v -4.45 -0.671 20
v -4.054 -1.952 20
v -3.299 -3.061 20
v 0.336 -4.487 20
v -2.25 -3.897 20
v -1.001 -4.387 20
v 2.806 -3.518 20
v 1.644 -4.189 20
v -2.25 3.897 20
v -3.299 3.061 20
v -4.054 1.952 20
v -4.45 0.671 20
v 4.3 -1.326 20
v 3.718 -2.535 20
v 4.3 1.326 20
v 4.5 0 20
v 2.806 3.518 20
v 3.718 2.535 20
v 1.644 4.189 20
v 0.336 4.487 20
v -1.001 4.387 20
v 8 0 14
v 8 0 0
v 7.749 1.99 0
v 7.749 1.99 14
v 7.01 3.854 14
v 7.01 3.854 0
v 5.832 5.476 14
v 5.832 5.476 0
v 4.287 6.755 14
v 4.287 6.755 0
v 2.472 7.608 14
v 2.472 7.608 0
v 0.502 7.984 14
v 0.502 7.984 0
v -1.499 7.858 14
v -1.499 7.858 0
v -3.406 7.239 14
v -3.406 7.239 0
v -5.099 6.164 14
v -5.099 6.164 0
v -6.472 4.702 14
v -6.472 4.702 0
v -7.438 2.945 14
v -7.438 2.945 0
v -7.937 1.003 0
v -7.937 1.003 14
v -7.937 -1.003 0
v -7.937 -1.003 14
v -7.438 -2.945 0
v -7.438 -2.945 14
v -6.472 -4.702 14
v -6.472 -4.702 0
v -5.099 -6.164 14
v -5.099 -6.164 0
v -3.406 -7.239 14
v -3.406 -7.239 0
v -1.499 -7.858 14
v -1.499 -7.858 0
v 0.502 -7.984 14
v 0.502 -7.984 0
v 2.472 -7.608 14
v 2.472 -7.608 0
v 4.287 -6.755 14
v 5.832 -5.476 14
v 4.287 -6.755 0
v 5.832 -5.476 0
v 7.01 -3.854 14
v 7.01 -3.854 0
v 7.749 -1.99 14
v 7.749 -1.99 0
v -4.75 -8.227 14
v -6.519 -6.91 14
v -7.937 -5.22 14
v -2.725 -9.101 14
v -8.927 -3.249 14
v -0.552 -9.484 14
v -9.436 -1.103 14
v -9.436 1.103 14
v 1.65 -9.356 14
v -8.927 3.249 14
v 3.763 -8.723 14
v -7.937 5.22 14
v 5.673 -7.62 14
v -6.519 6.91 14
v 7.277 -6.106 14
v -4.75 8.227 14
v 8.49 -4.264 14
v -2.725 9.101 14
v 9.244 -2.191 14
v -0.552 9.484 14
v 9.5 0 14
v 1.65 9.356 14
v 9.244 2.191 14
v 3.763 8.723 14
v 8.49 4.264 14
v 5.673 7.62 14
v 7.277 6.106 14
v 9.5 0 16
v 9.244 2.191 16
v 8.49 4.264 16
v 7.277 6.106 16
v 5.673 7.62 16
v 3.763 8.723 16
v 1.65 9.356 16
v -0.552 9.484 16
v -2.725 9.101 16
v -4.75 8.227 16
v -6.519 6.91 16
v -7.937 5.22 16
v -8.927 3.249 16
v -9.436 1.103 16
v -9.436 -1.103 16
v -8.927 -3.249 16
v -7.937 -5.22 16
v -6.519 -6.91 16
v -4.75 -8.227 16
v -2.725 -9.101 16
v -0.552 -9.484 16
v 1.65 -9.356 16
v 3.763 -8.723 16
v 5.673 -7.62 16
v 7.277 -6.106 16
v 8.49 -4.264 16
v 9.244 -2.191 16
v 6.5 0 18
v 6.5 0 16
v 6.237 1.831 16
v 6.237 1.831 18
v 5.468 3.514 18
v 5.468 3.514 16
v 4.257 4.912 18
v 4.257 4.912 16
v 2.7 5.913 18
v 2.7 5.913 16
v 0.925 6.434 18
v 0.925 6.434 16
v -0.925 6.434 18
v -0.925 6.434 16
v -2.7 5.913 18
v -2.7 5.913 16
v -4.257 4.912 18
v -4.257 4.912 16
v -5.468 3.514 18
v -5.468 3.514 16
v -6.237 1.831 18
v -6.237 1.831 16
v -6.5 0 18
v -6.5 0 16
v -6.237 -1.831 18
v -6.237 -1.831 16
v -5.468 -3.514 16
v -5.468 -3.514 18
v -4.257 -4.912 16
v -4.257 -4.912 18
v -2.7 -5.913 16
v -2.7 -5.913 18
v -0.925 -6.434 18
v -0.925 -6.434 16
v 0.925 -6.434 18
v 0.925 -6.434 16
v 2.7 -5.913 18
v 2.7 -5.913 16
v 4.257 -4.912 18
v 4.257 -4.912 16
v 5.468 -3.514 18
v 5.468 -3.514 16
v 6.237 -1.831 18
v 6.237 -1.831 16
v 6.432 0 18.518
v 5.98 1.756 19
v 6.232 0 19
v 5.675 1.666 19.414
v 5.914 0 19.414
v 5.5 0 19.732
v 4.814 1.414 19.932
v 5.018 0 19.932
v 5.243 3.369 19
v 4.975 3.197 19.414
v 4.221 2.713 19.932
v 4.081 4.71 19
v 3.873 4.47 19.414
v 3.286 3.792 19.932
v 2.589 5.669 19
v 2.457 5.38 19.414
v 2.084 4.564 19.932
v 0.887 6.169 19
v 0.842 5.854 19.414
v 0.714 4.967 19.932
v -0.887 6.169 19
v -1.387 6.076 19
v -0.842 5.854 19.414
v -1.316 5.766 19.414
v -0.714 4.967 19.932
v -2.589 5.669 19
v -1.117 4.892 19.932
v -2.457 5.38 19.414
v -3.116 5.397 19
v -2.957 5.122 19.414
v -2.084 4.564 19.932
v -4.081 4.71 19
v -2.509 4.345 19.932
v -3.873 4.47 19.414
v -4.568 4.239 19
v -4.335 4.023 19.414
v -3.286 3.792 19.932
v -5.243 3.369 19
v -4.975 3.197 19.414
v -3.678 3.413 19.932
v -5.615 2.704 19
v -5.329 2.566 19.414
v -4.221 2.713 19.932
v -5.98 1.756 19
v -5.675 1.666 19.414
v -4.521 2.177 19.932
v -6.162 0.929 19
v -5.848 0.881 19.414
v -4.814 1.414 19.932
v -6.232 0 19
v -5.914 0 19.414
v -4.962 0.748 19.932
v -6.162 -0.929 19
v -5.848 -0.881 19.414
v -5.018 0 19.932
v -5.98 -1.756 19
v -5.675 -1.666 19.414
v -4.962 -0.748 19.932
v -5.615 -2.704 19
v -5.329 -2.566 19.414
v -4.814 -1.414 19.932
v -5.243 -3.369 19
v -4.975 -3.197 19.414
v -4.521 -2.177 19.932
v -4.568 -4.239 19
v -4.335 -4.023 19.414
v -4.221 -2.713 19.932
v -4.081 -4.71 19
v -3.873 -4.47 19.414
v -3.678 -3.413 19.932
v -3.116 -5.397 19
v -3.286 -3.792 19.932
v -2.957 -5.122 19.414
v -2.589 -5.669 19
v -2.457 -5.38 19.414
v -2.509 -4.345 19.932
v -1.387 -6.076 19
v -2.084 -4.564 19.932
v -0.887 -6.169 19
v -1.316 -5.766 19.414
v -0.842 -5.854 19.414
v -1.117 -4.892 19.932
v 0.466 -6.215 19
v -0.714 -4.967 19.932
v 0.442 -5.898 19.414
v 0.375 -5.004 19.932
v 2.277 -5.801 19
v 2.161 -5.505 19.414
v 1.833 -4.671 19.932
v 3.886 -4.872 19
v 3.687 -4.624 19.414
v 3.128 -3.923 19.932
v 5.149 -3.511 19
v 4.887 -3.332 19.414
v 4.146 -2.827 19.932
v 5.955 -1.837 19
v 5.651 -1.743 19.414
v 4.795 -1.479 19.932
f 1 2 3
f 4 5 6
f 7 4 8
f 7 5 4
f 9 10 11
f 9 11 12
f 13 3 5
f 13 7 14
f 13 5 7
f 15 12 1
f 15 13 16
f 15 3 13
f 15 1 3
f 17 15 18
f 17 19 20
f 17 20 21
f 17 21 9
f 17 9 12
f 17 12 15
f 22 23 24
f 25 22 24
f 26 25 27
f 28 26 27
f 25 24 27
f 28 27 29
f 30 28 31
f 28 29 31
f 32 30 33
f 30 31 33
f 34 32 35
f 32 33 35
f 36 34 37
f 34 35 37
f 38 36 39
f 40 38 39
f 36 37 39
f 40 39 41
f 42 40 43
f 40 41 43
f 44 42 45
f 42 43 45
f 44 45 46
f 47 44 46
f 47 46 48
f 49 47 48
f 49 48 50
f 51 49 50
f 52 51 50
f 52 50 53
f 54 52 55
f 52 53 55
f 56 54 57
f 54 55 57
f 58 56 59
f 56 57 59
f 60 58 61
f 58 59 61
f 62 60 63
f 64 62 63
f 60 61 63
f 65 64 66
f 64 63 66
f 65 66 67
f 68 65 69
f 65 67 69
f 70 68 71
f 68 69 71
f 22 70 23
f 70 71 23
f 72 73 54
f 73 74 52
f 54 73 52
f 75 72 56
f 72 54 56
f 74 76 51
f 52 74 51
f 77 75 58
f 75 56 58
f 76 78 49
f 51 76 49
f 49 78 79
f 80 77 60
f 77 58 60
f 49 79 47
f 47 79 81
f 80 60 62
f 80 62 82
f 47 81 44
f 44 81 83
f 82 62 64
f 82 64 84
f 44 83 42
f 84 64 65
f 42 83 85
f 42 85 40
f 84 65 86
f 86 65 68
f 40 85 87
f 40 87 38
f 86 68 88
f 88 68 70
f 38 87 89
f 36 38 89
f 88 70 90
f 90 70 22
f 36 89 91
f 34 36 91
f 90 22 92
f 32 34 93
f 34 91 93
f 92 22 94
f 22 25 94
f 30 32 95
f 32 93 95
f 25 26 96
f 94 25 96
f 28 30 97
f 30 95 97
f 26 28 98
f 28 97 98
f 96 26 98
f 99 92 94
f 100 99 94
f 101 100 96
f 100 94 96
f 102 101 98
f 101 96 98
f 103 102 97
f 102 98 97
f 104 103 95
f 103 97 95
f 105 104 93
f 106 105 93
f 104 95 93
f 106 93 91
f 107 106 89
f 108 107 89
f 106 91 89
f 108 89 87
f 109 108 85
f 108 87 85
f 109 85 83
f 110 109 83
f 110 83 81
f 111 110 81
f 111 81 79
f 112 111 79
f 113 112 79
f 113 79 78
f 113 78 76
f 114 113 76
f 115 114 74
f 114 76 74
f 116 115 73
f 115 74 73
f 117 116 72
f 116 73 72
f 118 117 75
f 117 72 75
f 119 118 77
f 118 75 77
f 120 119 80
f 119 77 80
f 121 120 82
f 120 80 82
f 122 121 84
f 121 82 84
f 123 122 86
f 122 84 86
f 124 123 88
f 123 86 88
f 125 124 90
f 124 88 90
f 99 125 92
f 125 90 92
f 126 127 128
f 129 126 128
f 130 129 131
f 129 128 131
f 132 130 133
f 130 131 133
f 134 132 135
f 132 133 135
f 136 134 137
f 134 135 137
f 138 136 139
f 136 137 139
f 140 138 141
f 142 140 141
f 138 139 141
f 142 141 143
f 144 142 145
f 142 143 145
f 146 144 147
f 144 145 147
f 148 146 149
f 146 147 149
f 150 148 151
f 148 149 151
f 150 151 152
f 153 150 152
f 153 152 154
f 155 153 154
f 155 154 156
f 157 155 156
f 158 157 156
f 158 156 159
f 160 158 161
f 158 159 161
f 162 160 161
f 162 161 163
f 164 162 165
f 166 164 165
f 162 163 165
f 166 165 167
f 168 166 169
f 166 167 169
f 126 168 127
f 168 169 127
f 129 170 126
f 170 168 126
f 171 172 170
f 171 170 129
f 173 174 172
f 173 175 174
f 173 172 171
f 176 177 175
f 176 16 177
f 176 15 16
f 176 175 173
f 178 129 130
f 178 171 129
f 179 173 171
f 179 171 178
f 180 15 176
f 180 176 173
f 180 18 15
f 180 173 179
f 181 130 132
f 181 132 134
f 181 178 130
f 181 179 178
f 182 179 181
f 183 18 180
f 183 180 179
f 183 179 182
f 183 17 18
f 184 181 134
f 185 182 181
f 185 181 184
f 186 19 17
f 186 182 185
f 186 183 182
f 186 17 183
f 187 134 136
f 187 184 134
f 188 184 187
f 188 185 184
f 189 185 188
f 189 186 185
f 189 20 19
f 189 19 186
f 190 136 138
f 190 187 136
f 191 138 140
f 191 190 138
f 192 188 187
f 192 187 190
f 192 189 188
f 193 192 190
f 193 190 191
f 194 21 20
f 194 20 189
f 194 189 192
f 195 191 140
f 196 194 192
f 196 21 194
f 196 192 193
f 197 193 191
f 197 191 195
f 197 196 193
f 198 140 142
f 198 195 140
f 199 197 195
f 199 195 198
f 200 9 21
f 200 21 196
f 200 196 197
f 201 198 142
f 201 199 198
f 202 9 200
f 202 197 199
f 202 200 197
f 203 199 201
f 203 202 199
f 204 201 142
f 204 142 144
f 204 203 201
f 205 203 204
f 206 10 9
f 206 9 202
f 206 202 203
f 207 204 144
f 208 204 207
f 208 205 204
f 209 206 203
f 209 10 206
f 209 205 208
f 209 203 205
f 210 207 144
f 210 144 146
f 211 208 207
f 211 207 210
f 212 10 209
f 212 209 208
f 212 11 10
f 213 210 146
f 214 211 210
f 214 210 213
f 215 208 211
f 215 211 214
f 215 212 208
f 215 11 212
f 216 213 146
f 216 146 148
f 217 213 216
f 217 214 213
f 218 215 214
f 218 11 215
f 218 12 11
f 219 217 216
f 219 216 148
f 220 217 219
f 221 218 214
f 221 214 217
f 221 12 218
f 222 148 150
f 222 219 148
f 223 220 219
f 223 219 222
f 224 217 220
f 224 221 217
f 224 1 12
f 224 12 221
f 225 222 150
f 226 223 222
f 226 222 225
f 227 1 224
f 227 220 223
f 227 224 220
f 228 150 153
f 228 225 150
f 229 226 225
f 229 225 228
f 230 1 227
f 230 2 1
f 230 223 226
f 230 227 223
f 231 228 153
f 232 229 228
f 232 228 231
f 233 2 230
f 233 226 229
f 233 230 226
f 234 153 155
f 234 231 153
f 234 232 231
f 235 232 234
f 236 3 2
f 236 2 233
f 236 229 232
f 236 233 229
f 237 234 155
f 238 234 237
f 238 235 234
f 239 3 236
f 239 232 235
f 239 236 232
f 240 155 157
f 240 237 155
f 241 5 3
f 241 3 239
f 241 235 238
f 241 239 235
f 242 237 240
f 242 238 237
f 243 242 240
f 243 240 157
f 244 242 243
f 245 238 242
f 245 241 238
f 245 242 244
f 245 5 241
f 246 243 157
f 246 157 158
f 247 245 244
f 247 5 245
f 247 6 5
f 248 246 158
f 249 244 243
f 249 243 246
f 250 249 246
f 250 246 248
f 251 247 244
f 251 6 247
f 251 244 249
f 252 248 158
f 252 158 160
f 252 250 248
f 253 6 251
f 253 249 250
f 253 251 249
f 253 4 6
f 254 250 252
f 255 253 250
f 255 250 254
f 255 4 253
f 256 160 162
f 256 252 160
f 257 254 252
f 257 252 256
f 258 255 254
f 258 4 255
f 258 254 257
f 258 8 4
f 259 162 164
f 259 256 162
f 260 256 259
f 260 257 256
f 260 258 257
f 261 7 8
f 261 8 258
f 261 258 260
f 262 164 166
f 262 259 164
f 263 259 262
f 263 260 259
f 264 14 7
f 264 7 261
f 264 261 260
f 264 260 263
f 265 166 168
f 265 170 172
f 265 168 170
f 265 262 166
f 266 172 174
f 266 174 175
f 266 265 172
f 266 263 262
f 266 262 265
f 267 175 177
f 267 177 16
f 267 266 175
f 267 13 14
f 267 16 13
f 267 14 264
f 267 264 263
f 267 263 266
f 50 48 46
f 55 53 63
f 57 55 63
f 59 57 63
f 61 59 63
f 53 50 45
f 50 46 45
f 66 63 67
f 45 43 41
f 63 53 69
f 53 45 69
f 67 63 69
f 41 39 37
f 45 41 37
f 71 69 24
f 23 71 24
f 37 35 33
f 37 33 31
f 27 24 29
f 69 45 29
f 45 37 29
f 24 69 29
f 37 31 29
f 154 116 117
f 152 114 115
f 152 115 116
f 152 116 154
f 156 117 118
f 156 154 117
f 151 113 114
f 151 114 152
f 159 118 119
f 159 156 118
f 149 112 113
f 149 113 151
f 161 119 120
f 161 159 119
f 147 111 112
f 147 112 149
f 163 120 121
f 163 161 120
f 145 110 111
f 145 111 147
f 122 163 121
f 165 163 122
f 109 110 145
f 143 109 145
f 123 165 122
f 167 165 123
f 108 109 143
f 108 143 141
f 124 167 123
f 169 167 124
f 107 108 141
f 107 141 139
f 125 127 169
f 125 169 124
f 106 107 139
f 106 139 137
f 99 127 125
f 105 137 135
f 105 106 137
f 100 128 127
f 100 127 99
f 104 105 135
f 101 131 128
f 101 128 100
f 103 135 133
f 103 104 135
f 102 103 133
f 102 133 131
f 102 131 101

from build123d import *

# Parameters (mm, degrees)
SKETCH1_R           = 8
BOSS_EXTRUDE1_DEPTH = 14
SKETCH2_R           = 9.5
BOSS_EXTRUDE2_DEPTH = 2
SKETCH3_R           = 6.5
BOSS_EXTRUDE3_DEPTH = 4
FILLET1_R           = 2


with BuildPart() as part:
    # Sketch1 → Boss-Extrude1 (new body)
    with BuildSketch(Plane.XY):
        Circle(SKETCH1_R)
    extrude(amount=BOSS_EXTRUDE1_DEPTH)

    # Sketch2 → Boss-Extrude2 (add)
    with BuildSketch(Plane.XY.offset(14)):
        Circle(SKETCH2_R)
    extrude(amount=BOSS_EXTRUDE2_DEPTH)

    # Sketch3 → Boss-Extrude3 (add)
    with BuildSketch(Plane.XY.offset(16)):
        Circle(SKETCH3_R)
    extrude(amount=BOSS_EXTRUDE3_DEPTH)

    # Fillet1
    fillet1_edges = [part.edges().sort_by_distance(p)[0] for p in [
        (-6.5, 0, 20),
    ]]
    fillet(fillet1_edges, radius=FILLET1_R)


solid = part.part
